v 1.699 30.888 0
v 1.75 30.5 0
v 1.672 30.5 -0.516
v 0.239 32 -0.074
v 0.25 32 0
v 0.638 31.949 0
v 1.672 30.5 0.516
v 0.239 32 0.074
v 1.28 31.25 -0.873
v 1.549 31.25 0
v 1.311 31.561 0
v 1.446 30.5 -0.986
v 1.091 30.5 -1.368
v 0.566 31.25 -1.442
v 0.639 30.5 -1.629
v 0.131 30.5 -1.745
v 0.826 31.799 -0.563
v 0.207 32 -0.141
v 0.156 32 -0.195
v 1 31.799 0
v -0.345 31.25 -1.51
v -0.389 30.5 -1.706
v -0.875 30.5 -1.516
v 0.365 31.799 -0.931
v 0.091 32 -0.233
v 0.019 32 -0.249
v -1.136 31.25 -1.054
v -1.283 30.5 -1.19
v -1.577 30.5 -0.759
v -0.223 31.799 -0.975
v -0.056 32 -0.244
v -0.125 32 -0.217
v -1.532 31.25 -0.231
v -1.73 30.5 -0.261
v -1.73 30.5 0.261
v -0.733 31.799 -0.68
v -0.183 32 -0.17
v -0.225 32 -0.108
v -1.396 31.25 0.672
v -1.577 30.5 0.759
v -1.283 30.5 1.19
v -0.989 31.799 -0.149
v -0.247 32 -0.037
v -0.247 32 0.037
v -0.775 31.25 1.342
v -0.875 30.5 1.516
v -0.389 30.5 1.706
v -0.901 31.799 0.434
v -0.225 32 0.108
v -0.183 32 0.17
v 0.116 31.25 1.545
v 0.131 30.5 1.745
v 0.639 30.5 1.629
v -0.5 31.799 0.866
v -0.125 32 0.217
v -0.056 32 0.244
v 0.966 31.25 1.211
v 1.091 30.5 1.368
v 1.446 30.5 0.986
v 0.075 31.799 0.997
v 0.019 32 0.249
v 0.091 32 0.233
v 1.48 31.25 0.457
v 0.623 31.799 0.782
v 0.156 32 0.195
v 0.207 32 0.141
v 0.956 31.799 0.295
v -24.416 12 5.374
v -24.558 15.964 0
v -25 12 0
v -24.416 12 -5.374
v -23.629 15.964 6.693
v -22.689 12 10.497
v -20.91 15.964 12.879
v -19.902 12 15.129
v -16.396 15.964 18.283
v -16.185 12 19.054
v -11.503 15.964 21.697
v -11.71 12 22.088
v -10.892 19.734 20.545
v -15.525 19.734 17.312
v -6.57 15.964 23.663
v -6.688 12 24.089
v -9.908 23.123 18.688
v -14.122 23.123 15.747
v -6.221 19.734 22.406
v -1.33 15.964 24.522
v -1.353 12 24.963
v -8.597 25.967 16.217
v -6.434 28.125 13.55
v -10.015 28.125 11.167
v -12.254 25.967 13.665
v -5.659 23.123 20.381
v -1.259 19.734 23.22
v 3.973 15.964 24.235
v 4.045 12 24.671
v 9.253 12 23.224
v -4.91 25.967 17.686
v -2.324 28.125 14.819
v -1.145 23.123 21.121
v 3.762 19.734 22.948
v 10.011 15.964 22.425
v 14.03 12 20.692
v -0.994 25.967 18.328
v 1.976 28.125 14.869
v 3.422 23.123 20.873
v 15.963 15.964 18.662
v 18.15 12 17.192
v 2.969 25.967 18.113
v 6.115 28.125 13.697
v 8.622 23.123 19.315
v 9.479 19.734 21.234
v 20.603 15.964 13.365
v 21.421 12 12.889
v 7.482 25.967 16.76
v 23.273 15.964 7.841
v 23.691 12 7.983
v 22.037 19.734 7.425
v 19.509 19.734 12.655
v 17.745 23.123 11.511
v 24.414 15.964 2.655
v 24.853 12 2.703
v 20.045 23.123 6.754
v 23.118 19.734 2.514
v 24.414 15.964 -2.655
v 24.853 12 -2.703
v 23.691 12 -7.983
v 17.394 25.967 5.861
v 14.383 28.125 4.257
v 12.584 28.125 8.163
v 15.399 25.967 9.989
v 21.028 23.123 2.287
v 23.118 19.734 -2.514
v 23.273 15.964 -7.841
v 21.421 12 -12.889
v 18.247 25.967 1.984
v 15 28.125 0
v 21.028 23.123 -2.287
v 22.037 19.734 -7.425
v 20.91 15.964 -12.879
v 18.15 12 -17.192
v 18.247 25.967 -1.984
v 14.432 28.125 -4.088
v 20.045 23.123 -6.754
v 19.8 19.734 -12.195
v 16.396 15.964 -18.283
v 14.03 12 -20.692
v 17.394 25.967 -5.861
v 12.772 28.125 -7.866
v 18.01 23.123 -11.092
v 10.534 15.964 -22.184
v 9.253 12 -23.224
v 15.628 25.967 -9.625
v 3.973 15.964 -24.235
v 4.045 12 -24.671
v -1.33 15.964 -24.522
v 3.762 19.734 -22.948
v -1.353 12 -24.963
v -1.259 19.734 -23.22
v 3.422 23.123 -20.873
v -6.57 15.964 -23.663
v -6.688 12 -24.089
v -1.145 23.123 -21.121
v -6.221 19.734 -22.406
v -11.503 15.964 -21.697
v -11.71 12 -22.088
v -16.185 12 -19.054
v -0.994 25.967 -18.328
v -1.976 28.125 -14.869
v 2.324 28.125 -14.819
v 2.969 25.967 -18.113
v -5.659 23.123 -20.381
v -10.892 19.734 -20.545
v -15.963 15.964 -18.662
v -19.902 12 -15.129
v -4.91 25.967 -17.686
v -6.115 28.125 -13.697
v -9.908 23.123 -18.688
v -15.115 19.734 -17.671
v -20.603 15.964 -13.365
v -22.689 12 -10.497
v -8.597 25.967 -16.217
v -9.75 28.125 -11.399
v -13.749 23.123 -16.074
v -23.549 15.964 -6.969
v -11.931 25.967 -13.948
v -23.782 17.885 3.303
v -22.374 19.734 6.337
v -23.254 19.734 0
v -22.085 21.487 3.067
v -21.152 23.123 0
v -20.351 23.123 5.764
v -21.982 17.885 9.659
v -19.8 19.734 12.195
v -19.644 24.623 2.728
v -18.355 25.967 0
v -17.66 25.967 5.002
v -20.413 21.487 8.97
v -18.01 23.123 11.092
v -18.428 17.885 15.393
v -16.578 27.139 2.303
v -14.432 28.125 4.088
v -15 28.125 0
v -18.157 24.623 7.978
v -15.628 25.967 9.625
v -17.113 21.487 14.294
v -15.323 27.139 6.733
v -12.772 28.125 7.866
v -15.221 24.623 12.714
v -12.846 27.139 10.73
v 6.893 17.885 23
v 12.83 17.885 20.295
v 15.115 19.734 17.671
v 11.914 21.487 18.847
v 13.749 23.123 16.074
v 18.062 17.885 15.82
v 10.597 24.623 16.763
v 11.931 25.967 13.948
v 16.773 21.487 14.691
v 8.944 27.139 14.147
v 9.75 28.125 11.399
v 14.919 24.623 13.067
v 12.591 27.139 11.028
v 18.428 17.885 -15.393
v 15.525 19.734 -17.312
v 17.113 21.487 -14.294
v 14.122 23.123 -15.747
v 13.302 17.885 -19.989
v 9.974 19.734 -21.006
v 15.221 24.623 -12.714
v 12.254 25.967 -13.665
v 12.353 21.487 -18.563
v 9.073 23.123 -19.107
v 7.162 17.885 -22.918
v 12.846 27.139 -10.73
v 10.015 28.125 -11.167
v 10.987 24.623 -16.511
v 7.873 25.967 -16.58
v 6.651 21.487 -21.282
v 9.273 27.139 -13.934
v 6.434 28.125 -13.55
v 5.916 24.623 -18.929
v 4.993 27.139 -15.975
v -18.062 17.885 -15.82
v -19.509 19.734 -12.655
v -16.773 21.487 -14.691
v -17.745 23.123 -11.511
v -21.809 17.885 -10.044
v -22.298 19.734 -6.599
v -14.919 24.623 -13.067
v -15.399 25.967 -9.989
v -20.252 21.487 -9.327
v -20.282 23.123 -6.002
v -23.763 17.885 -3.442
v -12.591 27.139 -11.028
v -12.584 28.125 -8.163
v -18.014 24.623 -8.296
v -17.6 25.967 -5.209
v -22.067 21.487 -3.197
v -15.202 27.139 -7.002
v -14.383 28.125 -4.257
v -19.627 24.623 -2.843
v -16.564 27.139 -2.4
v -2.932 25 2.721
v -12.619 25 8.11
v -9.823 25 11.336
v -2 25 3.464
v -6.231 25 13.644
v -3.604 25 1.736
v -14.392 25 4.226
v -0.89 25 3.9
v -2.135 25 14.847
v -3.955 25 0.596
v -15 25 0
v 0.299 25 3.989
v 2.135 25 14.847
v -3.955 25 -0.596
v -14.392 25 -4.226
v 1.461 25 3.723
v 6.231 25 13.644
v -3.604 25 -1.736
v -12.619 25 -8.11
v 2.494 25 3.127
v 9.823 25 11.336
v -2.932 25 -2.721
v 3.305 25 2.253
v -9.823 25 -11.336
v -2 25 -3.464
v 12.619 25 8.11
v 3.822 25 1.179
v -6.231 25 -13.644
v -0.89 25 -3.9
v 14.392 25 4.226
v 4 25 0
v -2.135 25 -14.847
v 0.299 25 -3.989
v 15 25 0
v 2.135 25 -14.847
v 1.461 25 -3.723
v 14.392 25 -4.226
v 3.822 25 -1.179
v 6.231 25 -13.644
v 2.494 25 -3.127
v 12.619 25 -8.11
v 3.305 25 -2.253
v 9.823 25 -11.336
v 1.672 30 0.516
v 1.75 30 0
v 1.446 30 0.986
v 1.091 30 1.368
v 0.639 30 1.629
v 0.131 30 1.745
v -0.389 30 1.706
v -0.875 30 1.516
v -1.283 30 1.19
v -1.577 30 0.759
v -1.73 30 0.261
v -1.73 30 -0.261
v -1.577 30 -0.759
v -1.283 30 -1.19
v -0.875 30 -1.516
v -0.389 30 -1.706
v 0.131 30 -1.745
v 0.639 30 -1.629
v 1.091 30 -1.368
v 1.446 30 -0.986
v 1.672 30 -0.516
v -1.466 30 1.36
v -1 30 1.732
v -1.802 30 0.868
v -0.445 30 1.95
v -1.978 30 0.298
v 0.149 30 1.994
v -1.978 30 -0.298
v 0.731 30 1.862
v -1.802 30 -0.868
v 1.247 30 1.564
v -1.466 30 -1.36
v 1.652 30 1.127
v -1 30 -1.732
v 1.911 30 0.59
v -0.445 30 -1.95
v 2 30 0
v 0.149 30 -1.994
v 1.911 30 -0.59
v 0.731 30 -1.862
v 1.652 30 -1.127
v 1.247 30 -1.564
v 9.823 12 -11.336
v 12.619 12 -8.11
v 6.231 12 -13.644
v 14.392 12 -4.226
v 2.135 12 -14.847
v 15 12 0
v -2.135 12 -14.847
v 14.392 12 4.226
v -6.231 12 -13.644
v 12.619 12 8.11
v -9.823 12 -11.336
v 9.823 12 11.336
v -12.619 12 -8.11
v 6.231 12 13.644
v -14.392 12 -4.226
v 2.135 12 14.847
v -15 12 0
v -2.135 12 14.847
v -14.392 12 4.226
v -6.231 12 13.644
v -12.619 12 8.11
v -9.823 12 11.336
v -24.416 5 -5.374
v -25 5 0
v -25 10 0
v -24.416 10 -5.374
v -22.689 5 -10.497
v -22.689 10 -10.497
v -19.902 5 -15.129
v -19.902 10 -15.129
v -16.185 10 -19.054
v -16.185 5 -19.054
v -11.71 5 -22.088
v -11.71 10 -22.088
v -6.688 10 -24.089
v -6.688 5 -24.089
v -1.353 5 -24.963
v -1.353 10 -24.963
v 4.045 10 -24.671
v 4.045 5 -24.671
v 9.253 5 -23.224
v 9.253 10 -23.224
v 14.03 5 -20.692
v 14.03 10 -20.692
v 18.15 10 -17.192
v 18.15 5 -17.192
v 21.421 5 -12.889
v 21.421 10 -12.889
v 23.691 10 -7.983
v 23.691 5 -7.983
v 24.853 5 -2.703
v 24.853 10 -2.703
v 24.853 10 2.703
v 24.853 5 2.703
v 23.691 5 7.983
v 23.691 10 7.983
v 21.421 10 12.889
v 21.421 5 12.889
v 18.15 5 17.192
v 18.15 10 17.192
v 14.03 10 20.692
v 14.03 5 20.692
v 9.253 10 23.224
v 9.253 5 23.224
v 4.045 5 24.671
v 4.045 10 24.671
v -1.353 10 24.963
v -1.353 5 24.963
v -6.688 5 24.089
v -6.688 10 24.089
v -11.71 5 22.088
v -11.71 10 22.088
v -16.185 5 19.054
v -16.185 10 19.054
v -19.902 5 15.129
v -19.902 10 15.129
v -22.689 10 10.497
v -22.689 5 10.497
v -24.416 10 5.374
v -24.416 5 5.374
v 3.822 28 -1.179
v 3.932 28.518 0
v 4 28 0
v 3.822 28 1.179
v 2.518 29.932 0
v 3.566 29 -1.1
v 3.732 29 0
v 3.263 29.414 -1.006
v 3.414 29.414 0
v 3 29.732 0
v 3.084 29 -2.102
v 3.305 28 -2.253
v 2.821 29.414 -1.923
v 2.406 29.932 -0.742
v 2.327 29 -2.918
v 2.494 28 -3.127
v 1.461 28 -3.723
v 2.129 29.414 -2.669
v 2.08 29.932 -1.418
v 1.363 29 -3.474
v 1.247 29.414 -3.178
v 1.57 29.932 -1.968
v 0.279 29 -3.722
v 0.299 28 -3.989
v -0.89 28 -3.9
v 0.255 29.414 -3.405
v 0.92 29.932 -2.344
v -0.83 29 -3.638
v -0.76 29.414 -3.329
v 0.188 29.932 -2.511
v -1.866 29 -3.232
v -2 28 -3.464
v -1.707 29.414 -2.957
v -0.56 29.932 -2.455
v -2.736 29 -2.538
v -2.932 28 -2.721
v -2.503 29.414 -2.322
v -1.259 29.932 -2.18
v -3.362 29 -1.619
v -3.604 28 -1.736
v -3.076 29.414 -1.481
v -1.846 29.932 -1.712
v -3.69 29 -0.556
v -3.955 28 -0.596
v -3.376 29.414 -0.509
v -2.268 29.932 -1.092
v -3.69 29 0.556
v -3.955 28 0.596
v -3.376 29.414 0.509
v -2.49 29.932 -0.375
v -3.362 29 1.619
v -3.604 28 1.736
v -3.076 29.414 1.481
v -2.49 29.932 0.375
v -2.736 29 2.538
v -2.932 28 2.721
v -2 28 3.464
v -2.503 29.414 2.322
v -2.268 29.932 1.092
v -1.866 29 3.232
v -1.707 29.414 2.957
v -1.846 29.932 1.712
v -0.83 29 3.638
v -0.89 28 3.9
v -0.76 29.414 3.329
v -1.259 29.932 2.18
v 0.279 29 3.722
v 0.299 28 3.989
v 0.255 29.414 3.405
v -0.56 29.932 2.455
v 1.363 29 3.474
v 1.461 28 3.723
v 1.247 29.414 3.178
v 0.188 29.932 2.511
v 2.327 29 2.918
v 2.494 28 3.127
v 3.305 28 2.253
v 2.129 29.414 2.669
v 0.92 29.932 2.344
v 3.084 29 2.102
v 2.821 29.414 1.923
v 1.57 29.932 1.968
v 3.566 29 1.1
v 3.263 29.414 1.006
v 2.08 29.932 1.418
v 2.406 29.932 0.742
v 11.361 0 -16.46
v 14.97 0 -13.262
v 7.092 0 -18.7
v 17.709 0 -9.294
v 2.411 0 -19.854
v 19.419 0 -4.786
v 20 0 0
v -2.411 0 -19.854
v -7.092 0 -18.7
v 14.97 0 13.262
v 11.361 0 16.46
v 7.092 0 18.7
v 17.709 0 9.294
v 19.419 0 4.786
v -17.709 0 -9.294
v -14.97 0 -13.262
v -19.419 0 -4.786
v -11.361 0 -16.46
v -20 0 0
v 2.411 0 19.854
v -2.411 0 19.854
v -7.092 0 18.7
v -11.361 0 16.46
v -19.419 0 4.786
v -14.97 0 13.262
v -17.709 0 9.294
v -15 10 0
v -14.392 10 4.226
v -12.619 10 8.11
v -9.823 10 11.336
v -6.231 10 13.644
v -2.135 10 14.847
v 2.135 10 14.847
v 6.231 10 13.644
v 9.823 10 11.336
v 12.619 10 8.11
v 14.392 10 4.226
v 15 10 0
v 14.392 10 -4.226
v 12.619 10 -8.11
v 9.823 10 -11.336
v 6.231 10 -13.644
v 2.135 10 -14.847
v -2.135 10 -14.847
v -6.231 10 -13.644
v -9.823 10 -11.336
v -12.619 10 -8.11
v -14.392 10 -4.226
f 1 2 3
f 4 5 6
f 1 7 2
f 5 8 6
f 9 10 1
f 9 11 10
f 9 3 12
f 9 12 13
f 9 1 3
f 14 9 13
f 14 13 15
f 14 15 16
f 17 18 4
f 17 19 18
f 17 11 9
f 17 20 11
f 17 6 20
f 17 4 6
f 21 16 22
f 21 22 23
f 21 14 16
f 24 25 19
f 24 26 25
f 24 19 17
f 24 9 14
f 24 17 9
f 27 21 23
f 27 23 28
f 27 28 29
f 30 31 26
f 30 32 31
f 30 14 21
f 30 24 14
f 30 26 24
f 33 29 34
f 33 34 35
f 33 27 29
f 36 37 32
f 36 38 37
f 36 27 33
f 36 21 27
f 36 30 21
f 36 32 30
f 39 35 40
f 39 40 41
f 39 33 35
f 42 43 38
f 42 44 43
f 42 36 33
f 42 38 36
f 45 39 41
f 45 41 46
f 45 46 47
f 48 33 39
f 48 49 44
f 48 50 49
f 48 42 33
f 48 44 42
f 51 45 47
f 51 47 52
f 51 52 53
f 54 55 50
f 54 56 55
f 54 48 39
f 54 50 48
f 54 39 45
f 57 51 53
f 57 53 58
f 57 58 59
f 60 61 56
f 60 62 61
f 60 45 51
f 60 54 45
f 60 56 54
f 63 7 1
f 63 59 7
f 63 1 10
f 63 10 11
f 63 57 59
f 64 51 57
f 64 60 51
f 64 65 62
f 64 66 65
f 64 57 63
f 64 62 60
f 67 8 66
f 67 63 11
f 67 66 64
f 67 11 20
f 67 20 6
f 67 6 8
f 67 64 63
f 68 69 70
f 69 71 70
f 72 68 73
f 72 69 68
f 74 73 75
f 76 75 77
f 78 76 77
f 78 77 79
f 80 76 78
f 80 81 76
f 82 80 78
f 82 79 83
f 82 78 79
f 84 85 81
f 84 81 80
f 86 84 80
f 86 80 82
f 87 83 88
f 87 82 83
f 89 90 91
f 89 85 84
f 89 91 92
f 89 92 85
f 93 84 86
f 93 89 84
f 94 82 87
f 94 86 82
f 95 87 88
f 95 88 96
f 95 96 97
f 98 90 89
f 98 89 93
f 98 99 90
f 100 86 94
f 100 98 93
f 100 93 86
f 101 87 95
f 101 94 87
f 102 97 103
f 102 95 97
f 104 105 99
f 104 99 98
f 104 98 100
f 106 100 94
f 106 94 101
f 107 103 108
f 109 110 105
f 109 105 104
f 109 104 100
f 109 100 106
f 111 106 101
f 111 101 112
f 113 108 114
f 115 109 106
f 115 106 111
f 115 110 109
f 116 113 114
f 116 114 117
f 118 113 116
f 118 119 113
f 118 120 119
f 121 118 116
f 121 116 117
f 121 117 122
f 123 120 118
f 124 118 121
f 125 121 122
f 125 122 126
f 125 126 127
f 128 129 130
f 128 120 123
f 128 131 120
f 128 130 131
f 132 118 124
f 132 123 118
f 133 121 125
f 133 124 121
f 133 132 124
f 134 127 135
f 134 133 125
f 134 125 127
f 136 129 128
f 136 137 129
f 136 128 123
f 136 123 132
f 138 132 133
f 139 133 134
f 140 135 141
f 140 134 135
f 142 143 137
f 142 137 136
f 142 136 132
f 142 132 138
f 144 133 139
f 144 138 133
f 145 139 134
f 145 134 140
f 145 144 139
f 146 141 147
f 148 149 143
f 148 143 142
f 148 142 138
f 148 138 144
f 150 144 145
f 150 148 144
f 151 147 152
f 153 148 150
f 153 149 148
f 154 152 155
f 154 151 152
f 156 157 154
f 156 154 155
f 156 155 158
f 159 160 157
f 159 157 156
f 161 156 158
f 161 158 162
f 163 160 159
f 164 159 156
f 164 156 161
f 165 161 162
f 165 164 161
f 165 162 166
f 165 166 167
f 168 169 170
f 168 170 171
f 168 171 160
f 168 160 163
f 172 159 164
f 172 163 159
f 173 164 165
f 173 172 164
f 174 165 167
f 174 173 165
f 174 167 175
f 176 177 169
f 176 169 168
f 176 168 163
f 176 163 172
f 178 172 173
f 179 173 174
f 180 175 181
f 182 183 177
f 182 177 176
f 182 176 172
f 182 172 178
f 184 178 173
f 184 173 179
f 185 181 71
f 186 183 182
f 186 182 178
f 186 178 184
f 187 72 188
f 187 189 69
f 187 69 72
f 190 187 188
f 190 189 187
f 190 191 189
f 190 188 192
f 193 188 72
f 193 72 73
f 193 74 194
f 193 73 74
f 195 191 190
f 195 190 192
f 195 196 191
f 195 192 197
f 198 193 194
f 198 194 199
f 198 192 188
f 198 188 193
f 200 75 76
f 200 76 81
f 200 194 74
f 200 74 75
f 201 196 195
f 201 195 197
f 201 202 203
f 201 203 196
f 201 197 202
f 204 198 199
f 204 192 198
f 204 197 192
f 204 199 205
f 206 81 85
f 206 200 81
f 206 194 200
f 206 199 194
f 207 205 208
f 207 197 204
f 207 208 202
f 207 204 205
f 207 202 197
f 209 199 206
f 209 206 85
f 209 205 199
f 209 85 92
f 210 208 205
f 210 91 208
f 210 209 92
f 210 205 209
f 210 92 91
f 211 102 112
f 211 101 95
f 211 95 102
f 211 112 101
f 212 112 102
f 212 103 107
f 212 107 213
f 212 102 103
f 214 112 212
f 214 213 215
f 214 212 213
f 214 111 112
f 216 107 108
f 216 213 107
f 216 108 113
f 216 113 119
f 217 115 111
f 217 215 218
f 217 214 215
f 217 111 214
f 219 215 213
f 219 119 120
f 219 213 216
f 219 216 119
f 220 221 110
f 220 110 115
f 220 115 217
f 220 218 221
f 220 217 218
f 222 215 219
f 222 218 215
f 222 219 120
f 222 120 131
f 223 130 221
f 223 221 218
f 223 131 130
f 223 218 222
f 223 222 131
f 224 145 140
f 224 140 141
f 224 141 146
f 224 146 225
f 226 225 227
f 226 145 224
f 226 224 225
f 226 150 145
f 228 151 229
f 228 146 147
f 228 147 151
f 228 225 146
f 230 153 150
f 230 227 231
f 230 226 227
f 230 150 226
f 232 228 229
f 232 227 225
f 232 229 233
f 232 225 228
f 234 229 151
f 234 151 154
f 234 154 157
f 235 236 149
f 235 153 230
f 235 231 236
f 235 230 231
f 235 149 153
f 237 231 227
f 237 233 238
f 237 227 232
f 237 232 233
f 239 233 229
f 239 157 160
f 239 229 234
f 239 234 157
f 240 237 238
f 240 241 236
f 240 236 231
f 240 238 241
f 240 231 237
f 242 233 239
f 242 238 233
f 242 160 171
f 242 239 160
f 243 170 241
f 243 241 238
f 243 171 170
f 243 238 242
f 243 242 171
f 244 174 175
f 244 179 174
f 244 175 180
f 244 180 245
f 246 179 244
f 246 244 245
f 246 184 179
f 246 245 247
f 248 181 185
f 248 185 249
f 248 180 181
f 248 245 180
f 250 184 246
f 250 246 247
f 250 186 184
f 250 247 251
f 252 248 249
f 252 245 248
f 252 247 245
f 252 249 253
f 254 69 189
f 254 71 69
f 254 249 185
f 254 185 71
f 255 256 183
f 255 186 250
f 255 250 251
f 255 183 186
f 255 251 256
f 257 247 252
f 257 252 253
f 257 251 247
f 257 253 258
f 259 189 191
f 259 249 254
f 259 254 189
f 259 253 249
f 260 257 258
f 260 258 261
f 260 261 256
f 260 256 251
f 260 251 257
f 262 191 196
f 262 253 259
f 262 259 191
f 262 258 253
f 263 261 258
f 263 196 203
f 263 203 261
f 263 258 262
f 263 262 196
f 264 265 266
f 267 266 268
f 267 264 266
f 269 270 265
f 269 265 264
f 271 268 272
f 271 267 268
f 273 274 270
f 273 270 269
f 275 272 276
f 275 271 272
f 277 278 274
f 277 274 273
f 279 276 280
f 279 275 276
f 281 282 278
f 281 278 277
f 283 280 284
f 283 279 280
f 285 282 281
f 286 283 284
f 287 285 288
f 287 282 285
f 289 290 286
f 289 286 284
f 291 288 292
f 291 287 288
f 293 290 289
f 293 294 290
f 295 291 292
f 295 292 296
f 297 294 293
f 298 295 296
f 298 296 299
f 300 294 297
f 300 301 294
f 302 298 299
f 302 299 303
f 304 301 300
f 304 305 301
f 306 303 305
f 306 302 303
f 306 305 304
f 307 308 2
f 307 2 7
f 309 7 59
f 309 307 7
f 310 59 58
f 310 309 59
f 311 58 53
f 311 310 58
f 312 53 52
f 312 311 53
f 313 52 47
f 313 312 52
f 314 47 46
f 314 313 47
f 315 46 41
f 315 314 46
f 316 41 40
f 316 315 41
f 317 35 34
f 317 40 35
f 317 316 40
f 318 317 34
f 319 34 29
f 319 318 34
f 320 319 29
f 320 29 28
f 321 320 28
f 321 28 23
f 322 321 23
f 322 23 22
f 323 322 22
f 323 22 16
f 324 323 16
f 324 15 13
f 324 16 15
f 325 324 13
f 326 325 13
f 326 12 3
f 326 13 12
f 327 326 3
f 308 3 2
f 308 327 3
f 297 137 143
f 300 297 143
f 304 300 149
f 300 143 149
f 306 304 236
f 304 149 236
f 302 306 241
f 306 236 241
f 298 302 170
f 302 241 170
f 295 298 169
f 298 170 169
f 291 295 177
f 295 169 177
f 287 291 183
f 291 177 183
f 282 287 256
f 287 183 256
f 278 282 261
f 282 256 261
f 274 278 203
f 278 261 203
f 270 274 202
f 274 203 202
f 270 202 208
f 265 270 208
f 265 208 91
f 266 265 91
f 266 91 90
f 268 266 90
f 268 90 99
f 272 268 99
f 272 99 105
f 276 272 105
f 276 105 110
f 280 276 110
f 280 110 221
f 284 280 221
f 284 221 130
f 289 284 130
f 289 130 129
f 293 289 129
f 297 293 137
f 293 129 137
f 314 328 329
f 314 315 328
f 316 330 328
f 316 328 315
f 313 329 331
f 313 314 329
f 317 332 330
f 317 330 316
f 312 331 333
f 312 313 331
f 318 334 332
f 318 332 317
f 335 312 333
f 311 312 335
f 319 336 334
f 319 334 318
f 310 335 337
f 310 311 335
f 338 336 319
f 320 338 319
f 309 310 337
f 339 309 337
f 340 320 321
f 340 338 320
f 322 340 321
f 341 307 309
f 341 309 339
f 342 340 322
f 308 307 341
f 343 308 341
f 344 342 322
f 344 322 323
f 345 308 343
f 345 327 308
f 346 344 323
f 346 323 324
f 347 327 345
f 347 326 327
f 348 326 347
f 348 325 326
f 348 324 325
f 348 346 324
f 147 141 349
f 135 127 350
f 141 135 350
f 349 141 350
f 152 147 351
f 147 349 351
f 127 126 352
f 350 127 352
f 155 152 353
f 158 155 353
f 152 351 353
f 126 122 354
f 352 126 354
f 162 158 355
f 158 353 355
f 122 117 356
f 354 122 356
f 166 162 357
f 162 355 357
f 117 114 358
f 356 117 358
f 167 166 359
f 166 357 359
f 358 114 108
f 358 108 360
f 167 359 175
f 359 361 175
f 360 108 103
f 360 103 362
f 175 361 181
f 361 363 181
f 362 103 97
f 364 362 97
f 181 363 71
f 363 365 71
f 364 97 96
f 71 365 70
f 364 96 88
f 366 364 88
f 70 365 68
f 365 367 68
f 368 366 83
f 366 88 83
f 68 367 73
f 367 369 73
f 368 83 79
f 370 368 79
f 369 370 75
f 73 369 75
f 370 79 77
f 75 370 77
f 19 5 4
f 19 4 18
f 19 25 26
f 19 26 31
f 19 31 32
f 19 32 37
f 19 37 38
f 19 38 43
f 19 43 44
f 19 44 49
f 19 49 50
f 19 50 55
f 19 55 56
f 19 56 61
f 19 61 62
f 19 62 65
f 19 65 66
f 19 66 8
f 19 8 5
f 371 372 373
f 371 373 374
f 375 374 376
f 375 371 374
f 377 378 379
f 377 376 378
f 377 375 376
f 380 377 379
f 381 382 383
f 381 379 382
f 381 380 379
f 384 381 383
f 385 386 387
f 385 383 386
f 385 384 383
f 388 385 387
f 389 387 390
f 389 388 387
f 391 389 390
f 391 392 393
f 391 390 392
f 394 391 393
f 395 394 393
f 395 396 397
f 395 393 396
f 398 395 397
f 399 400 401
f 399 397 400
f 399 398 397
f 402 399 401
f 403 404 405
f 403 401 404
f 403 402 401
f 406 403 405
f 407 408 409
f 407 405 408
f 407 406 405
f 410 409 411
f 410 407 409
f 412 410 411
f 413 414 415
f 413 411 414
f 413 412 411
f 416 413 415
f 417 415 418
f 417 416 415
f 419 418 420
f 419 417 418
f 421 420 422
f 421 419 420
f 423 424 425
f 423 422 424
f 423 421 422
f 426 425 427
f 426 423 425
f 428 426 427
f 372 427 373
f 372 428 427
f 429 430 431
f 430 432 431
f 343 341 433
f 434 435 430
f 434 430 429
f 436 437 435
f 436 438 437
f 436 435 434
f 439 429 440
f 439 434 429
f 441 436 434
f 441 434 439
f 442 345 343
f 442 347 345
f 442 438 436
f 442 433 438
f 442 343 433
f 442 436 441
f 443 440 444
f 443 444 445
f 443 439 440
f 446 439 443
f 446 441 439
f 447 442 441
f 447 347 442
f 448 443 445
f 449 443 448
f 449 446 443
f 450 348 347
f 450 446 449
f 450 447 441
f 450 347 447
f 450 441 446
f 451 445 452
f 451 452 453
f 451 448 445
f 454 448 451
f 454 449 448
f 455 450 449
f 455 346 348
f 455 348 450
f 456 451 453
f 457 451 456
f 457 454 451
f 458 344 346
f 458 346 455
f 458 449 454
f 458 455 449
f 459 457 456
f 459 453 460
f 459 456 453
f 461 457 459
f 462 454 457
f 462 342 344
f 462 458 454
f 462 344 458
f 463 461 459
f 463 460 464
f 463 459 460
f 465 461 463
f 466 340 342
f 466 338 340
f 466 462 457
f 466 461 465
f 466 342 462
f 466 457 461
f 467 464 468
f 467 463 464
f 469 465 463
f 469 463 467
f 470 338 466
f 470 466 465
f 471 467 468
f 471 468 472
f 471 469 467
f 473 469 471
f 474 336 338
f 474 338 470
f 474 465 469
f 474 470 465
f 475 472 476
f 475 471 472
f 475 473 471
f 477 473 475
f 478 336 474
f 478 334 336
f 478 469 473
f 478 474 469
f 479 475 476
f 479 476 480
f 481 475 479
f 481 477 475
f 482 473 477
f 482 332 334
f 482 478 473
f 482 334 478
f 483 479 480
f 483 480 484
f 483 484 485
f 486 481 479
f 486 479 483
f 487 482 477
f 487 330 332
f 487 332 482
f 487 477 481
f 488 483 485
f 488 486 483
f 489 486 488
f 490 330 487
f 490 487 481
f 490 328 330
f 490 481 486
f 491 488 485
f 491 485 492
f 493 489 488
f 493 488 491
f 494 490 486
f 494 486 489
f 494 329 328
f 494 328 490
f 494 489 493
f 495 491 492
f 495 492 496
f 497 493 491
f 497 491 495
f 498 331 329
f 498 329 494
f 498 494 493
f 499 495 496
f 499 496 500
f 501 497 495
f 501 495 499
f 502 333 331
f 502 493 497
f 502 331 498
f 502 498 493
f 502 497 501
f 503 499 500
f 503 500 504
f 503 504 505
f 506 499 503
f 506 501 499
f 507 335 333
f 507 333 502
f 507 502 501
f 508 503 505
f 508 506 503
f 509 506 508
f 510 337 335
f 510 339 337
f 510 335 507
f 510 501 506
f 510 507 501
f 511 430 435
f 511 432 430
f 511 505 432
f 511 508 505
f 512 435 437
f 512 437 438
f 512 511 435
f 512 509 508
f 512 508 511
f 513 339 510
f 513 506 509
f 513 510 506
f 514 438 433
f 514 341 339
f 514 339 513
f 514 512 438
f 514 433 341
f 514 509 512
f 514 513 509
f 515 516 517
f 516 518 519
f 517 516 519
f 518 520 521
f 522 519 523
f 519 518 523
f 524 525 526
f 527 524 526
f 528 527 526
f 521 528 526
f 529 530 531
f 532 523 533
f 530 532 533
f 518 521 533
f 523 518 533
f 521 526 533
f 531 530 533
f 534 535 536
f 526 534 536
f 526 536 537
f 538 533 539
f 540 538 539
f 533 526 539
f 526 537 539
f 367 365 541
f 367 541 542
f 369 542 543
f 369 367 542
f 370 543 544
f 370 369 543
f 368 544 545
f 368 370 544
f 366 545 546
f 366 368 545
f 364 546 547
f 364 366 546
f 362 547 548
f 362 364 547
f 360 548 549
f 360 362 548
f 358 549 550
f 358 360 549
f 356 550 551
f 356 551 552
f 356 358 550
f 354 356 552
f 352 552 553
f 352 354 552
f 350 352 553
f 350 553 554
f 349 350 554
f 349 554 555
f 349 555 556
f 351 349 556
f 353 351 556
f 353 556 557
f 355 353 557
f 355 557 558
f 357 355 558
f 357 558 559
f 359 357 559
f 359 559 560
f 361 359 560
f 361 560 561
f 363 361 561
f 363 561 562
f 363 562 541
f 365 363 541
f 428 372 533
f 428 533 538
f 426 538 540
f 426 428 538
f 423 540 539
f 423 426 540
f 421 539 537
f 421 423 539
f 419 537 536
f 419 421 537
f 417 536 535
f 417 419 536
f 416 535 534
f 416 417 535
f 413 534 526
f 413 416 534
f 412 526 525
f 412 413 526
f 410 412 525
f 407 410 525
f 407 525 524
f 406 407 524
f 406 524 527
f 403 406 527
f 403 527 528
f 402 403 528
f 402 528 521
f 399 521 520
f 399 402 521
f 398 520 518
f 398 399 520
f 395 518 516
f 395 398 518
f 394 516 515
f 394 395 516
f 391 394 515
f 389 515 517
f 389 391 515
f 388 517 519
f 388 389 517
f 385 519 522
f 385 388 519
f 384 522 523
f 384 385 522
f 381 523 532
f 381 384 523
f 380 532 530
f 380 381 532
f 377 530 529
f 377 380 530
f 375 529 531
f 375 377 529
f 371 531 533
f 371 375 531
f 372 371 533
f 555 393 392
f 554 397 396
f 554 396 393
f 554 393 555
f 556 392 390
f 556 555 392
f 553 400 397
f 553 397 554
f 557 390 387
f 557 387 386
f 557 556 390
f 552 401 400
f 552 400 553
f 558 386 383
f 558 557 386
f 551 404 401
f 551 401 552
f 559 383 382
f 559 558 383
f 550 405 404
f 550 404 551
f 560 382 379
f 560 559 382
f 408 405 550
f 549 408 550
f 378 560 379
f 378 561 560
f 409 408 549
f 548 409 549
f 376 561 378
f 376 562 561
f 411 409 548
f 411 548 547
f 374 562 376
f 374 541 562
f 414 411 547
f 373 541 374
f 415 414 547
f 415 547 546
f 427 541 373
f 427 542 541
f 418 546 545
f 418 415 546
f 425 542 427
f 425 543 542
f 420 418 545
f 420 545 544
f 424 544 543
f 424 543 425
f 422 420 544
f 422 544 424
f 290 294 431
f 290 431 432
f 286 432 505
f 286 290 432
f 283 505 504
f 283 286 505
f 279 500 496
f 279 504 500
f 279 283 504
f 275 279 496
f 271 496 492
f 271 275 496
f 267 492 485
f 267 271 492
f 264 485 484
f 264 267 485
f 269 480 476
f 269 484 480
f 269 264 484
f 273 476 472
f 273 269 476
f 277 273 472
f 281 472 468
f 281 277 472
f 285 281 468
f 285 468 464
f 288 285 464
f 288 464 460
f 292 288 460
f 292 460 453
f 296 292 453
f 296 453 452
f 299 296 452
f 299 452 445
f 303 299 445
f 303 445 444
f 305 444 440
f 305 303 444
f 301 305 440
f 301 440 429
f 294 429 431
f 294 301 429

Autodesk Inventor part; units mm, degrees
ref_plane "YZ Plane" through (0, 0, 0) normal (1, 0, 0) x (0, 1, 0)
ref_plane "XY Plane" through (0, 0, 0) normal (0, 0, 1) x (1, 0, 0)
sketch "Sketch1" plane through (0, 0, 0) normal (0, 1, 0) x (-1, 0, 0)
  circle A0 centre (0, 0) radius 25
  dimension "d0" = 50
extrude "Extrusion1" add sketch "Sketch1" along normal blind 30
fillet "Fillet1" radius 18 1 edges at (25, 30, 0)
chamfer "Chamfer1" distance 5 angle 45 1 edges at (25, 0, 0)
sketch "Sketch2" plane through (0, 30, 0) normal (0, 1, 0) x (1, 0, 0)
  line L0 (0, 0) -> (6.5883, 0)
  line L1 (6.5883, 0) -> (-7, 0)
  circle A0 centre (0, 0) radius 7 projected
  circle A1 centre (0, 0) radius 6.5883
  circle A2 centre (0, 0) radius 25
  circle A3 centre (0, 0) radius 15
  dimension "d7" = 30
extrude "Extrusion2" cut sketch "Sketch2" against normal blind 5 contours L1 A1 L0 | L0 A1 L1 | A0 | A3
sketch "Sketch3" plane through (0, 25, 0) normal (0, 1, 0) x (1, 0, 0)
  circle A0 centre (0, 0) radius 4
  dimension "d10" = 8
extrude "Extrusion3" add sketch "Sketch3" along normal blind 5
fillet "Fillet2" radius 2 1 edges at (-4, 30, 0)
ref_plane "Work Plane1" through (0, 12, 0) normal (0, 1, 0) x (-1, 0, 0)
sketch "Sketch4" plane through (0, 12, 0) normal (0, 1, 0) x (-1, 0, 0)
  circle A0 centre (0, 0) radius 4 projected
  circle A1 centre (0, 0) radius 25
  circle A2 centre (0, 0) radius 2 projected
  circle A3 centre (0, 0) radius 15
  dimension "d21" = 30
sketch "Sketch5" plane through (0, 30, 0) normal (0, 1, 0) x (1, 0, 0)
  circle A0 centre (0, 0) radius 2
  circle A1 centre (0, 0) radius 1.75
  dimension "d17" = 3.5
extrude "Extrusion5" add sketch "Sketch5" along normal blind 2 contours A1
fillet "Fillet3" radius 1.5 1 edges at (-1.75, 32, 0)
extrude "Extrusion6" cut sketch "Sketch4" against normal blind 2 contours A1
properties part number "camera"
